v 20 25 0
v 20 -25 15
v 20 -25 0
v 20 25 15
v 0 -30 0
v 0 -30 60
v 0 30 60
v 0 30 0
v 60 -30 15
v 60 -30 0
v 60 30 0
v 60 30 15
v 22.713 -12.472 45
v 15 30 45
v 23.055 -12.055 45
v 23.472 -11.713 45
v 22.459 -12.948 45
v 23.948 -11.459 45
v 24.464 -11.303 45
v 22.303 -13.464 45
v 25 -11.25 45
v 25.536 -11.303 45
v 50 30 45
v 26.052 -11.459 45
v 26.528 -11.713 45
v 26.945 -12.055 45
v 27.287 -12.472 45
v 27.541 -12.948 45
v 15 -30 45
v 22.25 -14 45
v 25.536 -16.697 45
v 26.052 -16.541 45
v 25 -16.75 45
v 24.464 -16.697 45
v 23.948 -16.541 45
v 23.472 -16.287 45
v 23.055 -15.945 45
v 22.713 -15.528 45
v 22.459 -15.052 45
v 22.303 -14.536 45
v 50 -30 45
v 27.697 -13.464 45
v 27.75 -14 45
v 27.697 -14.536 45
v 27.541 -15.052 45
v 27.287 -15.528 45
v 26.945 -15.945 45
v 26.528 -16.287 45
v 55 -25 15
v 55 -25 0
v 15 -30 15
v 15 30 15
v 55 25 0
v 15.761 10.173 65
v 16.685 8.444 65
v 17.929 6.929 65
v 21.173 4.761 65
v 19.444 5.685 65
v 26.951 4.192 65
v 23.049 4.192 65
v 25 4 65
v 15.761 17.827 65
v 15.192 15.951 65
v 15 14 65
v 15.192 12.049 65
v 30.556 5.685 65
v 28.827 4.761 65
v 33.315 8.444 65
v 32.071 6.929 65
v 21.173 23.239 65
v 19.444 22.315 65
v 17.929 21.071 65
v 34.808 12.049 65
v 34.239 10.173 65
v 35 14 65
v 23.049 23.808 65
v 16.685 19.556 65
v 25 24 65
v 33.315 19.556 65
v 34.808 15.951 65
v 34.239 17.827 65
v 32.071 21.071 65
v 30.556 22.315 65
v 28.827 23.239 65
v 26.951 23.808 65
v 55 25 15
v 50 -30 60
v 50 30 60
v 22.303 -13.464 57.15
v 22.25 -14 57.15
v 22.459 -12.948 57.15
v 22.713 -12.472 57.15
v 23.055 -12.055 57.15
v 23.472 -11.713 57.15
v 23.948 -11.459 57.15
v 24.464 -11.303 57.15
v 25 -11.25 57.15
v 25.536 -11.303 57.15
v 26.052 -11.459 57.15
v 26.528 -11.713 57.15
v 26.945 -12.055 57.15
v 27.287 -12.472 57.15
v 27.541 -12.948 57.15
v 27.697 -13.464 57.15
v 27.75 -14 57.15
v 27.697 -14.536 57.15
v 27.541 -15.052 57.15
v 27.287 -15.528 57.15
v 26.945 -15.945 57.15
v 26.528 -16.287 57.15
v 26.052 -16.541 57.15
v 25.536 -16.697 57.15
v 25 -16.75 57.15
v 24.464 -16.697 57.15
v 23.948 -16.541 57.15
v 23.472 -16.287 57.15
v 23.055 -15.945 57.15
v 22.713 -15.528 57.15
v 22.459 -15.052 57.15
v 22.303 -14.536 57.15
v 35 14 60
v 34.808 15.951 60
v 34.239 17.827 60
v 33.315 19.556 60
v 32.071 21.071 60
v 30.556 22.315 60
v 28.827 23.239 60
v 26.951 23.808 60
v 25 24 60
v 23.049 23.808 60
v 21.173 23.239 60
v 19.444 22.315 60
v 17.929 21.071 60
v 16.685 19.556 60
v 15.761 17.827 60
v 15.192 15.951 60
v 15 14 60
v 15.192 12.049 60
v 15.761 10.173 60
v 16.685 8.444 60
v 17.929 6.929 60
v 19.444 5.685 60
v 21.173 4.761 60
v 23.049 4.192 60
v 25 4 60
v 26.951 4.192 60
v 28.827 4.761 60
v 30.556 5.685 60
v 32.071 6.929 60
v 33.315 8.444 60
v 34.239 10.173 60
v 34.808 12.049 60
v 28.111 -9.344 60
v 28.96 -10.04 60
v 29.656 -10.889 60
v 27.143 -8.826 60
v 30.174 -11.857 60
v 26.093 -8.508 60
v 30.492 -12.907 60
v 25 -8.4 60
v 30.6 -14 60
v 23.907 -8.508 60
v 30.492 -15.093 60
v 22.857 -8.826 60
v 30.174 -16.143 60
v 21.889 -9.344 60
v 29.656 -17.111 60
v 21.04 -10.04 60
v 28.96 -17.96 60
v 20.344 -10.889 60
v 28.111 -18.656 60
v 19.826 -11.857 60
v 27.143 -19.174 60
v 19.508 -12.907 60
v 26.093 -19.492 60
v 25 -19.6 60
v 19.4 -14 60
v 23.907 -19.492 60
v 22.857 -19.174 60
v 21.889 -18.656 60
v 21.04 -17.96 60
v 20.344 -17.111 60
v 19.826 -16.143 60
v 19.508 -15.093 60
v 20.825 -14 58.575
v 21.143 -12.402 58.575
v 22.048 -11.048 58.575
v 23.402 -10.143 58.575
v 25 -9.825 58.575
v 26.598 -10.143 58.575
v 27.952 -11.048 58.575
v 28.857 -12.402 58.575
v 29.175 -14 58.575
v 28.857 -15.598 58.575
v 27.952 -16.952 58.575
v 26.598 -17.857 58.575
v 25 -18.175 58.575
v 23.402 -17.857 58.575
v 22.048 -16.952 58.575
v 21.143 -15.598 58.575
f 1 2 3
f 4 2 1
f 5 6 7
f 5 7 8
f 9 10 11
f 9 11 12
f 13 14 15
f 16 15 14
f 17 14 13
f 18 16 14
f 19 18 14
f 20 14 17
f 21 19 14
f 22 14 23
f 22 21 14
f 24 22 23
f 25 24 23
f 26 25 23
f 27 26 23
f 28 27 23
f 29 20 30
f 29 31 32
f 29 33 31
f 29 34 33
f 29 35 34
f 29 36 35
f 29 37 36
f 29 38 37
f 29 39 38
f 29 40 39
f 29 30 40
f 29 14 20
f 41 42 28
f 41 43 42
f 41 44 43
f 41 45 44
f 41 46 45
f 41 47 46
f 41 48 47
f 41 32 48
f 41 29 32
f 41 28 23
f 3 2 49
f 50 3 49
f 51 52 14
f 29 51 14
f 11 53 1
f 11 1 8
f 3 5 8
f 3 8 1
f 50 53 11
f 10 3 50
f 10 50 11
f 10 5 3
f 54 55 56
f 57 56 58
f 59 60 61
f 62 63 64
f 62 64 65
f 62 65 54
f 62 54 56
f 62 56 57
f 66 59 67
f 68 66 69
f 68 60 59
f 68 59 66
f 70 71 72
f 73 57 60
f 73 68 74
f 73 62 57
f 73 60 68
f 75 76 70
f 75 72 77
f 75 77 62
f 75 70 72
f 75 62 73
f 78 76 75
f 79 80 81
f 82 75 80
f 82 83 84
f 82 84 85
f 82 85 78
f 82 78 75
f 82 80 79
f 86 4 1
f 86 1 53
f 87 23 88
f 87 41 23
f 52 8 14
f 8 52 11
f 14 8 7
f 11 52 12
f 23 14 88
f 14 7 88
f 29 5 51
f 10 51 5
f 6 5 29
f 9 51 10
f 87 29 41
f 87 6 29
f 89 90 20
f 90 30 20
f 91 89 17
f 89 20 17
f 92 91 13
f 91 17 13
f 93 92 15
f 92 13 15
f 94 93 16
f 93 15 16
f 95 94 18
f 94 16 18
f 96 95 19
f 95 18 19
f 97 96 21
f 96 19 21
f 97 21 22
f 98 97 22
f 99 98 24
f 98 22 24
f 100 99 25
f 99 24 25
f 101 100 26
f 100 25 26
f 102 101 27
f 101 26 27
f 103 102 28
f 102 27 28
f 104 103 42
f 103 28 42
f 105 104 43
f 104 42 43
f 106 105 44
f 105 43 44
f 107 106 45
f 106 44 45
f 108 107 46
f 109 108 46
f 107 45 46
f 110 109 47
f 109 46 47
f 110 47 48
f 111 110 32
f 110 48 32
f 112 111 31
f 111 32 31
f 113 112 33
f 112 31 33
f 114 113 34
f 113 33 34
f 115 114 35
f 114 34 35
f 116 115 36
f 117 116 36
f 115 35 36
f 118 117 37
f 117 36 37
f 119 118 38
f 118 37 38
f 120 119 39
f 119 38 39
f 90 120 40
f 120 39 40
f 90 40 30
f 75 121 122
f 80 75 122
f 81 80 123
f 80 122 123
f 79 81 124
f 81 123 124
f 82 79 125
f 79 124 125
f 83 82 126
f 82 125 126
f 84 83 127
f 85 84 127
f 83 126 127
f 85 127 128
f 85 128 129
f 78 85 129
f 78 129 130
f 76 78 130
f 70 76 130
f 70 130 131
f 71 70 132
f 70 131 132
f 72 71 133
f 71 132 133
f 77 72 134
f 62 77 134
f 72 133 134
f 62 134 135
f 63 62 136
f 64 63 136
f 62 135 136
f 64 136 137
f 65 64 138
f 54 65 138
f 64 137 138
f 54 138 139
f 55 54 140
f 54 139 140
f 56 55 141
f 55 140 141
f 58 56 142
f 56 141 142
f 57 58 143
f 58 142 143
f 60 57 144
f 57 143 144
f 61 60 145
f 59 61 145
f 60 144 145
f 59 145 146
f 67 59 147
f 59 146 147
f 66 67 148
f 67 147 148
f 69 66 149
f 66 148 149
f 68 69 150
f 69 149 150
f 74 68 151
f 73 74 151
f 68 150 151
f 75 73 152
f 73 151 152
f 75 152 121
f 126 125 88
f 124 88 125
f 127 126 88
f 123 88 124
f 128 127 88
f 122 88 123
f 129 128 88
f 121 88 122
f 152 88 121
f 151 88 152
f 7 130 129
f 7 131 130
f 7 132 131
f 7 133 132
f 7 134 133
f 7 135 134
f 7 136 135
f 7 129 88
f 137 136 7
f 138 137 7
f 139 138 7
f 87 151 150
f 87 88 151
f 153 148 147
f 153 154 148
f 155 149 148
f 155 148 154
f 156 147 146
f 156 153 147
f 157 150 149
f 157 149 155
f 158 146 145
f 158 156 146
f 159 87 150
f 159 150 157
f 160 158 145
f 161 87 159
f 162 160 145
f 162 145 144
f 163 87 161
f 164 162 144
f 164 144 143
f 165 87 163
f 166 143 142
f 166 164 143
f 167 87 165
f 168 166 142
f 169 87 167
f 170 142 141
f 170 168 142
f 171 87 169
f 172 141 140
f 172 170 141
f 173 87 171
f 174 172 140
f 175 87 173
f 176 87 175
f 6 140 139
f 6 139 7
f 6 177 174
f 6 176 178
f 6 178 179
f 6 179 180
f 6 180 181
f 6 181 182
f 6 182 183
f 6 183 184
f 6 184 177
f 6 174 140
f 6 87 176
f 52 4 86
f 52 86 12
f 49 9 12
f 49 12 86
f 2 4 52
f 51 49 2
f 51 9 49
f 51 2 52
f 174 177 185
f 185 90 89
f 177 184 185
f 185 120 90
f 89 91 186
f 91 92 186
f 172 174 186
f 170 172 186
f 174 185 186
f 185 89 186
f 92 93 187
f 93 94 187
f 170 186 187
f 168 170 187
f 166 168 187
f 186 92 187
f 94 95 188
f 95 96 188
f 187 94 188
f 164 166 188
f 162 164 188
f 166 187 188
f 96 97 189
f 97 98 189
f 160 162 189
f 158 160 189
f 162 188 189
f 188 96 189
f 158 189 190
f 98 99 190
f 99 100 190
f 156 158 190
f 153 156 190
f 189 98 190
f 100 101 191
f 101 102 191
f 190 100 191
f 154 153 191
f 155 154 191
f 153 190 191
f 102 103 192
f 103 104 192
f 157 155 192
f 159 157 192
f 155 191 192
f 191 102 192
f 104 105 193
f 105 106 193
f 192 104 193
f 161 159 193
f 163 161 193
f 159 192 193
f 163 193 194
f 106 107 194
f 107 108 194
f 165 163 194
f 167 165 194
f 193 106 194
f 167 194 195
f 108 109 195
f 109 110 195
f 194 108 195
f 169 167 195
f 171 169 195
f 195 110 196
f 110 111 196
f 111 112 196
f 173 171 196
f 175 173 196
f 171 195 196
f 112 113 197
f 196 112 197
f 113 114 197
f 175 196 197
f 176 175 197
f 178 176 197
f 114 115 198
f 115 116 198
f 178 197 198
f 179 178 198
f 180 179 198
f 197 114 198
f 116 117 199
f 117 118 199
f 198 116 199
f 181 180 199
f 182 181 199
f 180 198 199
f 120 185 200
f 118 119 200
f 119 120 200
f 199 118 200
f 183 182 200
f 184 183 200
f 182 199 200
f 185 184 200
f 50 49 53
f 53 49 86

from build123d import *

# Parameters (mm, degrees)
F1_DEPTH       = 30
F2_W           = 35
F2_H           = 50
F3_DEPTH       = 15.001
F5_D           = 5.5
F5_CSINK_D     = 11.2
F5_CSINK_ANGLE = 90
F4_R           = 10
F6_DEPTH       = 5
F7_R           = 8.3224131339
F8_DEPTH       = 5


with BuildPart() as f1:
    # F0 (on Front) → F1 (new body, symmetric)
    with BuildSketch(Plane.XZ):
        Polygon((50, 45), (50, 60), (0, 60), (0, 0), (60, 0), (60, 15), (15, 15), (15, 45), align=None)
    extrude(amount=F1_DEPTH, both=True)

    # F2 (on face) → F3 (cut, through all)
    with BuildSketch(Plane.XY.offset(15)):
        with Locations((37.5, 0)):
            Rectangle(F2_W, F2_H)
    extrude(amount=-F3_DEPTH, mode=Mode.SUBTRACT)

    # F5 (through all)
    with Locations(Plane.XY.offset(60)):
        with Locations((25, -14)):
            CounterSinkHole(F5_D / 2, F5_CSINK_D / 2, counter_sink_angle=F5_CSINK_ANGLE)

    # F4 (on face) → F6 (join)
    with BuildSketch(Plane.XY.offset(60)):
        with Locations((25, 14)):
            Circle(F4_R)
    extrude(amount=F6_DEPTH)

    # F7 (on face) → F8 (join)
    with BuildSketch(Plane.XY.offset(65)):
        with Locations((25, 14)):
            Circle(F7_R)
    extrude(amount=-F8_DEPTH)


solid = f1.part
